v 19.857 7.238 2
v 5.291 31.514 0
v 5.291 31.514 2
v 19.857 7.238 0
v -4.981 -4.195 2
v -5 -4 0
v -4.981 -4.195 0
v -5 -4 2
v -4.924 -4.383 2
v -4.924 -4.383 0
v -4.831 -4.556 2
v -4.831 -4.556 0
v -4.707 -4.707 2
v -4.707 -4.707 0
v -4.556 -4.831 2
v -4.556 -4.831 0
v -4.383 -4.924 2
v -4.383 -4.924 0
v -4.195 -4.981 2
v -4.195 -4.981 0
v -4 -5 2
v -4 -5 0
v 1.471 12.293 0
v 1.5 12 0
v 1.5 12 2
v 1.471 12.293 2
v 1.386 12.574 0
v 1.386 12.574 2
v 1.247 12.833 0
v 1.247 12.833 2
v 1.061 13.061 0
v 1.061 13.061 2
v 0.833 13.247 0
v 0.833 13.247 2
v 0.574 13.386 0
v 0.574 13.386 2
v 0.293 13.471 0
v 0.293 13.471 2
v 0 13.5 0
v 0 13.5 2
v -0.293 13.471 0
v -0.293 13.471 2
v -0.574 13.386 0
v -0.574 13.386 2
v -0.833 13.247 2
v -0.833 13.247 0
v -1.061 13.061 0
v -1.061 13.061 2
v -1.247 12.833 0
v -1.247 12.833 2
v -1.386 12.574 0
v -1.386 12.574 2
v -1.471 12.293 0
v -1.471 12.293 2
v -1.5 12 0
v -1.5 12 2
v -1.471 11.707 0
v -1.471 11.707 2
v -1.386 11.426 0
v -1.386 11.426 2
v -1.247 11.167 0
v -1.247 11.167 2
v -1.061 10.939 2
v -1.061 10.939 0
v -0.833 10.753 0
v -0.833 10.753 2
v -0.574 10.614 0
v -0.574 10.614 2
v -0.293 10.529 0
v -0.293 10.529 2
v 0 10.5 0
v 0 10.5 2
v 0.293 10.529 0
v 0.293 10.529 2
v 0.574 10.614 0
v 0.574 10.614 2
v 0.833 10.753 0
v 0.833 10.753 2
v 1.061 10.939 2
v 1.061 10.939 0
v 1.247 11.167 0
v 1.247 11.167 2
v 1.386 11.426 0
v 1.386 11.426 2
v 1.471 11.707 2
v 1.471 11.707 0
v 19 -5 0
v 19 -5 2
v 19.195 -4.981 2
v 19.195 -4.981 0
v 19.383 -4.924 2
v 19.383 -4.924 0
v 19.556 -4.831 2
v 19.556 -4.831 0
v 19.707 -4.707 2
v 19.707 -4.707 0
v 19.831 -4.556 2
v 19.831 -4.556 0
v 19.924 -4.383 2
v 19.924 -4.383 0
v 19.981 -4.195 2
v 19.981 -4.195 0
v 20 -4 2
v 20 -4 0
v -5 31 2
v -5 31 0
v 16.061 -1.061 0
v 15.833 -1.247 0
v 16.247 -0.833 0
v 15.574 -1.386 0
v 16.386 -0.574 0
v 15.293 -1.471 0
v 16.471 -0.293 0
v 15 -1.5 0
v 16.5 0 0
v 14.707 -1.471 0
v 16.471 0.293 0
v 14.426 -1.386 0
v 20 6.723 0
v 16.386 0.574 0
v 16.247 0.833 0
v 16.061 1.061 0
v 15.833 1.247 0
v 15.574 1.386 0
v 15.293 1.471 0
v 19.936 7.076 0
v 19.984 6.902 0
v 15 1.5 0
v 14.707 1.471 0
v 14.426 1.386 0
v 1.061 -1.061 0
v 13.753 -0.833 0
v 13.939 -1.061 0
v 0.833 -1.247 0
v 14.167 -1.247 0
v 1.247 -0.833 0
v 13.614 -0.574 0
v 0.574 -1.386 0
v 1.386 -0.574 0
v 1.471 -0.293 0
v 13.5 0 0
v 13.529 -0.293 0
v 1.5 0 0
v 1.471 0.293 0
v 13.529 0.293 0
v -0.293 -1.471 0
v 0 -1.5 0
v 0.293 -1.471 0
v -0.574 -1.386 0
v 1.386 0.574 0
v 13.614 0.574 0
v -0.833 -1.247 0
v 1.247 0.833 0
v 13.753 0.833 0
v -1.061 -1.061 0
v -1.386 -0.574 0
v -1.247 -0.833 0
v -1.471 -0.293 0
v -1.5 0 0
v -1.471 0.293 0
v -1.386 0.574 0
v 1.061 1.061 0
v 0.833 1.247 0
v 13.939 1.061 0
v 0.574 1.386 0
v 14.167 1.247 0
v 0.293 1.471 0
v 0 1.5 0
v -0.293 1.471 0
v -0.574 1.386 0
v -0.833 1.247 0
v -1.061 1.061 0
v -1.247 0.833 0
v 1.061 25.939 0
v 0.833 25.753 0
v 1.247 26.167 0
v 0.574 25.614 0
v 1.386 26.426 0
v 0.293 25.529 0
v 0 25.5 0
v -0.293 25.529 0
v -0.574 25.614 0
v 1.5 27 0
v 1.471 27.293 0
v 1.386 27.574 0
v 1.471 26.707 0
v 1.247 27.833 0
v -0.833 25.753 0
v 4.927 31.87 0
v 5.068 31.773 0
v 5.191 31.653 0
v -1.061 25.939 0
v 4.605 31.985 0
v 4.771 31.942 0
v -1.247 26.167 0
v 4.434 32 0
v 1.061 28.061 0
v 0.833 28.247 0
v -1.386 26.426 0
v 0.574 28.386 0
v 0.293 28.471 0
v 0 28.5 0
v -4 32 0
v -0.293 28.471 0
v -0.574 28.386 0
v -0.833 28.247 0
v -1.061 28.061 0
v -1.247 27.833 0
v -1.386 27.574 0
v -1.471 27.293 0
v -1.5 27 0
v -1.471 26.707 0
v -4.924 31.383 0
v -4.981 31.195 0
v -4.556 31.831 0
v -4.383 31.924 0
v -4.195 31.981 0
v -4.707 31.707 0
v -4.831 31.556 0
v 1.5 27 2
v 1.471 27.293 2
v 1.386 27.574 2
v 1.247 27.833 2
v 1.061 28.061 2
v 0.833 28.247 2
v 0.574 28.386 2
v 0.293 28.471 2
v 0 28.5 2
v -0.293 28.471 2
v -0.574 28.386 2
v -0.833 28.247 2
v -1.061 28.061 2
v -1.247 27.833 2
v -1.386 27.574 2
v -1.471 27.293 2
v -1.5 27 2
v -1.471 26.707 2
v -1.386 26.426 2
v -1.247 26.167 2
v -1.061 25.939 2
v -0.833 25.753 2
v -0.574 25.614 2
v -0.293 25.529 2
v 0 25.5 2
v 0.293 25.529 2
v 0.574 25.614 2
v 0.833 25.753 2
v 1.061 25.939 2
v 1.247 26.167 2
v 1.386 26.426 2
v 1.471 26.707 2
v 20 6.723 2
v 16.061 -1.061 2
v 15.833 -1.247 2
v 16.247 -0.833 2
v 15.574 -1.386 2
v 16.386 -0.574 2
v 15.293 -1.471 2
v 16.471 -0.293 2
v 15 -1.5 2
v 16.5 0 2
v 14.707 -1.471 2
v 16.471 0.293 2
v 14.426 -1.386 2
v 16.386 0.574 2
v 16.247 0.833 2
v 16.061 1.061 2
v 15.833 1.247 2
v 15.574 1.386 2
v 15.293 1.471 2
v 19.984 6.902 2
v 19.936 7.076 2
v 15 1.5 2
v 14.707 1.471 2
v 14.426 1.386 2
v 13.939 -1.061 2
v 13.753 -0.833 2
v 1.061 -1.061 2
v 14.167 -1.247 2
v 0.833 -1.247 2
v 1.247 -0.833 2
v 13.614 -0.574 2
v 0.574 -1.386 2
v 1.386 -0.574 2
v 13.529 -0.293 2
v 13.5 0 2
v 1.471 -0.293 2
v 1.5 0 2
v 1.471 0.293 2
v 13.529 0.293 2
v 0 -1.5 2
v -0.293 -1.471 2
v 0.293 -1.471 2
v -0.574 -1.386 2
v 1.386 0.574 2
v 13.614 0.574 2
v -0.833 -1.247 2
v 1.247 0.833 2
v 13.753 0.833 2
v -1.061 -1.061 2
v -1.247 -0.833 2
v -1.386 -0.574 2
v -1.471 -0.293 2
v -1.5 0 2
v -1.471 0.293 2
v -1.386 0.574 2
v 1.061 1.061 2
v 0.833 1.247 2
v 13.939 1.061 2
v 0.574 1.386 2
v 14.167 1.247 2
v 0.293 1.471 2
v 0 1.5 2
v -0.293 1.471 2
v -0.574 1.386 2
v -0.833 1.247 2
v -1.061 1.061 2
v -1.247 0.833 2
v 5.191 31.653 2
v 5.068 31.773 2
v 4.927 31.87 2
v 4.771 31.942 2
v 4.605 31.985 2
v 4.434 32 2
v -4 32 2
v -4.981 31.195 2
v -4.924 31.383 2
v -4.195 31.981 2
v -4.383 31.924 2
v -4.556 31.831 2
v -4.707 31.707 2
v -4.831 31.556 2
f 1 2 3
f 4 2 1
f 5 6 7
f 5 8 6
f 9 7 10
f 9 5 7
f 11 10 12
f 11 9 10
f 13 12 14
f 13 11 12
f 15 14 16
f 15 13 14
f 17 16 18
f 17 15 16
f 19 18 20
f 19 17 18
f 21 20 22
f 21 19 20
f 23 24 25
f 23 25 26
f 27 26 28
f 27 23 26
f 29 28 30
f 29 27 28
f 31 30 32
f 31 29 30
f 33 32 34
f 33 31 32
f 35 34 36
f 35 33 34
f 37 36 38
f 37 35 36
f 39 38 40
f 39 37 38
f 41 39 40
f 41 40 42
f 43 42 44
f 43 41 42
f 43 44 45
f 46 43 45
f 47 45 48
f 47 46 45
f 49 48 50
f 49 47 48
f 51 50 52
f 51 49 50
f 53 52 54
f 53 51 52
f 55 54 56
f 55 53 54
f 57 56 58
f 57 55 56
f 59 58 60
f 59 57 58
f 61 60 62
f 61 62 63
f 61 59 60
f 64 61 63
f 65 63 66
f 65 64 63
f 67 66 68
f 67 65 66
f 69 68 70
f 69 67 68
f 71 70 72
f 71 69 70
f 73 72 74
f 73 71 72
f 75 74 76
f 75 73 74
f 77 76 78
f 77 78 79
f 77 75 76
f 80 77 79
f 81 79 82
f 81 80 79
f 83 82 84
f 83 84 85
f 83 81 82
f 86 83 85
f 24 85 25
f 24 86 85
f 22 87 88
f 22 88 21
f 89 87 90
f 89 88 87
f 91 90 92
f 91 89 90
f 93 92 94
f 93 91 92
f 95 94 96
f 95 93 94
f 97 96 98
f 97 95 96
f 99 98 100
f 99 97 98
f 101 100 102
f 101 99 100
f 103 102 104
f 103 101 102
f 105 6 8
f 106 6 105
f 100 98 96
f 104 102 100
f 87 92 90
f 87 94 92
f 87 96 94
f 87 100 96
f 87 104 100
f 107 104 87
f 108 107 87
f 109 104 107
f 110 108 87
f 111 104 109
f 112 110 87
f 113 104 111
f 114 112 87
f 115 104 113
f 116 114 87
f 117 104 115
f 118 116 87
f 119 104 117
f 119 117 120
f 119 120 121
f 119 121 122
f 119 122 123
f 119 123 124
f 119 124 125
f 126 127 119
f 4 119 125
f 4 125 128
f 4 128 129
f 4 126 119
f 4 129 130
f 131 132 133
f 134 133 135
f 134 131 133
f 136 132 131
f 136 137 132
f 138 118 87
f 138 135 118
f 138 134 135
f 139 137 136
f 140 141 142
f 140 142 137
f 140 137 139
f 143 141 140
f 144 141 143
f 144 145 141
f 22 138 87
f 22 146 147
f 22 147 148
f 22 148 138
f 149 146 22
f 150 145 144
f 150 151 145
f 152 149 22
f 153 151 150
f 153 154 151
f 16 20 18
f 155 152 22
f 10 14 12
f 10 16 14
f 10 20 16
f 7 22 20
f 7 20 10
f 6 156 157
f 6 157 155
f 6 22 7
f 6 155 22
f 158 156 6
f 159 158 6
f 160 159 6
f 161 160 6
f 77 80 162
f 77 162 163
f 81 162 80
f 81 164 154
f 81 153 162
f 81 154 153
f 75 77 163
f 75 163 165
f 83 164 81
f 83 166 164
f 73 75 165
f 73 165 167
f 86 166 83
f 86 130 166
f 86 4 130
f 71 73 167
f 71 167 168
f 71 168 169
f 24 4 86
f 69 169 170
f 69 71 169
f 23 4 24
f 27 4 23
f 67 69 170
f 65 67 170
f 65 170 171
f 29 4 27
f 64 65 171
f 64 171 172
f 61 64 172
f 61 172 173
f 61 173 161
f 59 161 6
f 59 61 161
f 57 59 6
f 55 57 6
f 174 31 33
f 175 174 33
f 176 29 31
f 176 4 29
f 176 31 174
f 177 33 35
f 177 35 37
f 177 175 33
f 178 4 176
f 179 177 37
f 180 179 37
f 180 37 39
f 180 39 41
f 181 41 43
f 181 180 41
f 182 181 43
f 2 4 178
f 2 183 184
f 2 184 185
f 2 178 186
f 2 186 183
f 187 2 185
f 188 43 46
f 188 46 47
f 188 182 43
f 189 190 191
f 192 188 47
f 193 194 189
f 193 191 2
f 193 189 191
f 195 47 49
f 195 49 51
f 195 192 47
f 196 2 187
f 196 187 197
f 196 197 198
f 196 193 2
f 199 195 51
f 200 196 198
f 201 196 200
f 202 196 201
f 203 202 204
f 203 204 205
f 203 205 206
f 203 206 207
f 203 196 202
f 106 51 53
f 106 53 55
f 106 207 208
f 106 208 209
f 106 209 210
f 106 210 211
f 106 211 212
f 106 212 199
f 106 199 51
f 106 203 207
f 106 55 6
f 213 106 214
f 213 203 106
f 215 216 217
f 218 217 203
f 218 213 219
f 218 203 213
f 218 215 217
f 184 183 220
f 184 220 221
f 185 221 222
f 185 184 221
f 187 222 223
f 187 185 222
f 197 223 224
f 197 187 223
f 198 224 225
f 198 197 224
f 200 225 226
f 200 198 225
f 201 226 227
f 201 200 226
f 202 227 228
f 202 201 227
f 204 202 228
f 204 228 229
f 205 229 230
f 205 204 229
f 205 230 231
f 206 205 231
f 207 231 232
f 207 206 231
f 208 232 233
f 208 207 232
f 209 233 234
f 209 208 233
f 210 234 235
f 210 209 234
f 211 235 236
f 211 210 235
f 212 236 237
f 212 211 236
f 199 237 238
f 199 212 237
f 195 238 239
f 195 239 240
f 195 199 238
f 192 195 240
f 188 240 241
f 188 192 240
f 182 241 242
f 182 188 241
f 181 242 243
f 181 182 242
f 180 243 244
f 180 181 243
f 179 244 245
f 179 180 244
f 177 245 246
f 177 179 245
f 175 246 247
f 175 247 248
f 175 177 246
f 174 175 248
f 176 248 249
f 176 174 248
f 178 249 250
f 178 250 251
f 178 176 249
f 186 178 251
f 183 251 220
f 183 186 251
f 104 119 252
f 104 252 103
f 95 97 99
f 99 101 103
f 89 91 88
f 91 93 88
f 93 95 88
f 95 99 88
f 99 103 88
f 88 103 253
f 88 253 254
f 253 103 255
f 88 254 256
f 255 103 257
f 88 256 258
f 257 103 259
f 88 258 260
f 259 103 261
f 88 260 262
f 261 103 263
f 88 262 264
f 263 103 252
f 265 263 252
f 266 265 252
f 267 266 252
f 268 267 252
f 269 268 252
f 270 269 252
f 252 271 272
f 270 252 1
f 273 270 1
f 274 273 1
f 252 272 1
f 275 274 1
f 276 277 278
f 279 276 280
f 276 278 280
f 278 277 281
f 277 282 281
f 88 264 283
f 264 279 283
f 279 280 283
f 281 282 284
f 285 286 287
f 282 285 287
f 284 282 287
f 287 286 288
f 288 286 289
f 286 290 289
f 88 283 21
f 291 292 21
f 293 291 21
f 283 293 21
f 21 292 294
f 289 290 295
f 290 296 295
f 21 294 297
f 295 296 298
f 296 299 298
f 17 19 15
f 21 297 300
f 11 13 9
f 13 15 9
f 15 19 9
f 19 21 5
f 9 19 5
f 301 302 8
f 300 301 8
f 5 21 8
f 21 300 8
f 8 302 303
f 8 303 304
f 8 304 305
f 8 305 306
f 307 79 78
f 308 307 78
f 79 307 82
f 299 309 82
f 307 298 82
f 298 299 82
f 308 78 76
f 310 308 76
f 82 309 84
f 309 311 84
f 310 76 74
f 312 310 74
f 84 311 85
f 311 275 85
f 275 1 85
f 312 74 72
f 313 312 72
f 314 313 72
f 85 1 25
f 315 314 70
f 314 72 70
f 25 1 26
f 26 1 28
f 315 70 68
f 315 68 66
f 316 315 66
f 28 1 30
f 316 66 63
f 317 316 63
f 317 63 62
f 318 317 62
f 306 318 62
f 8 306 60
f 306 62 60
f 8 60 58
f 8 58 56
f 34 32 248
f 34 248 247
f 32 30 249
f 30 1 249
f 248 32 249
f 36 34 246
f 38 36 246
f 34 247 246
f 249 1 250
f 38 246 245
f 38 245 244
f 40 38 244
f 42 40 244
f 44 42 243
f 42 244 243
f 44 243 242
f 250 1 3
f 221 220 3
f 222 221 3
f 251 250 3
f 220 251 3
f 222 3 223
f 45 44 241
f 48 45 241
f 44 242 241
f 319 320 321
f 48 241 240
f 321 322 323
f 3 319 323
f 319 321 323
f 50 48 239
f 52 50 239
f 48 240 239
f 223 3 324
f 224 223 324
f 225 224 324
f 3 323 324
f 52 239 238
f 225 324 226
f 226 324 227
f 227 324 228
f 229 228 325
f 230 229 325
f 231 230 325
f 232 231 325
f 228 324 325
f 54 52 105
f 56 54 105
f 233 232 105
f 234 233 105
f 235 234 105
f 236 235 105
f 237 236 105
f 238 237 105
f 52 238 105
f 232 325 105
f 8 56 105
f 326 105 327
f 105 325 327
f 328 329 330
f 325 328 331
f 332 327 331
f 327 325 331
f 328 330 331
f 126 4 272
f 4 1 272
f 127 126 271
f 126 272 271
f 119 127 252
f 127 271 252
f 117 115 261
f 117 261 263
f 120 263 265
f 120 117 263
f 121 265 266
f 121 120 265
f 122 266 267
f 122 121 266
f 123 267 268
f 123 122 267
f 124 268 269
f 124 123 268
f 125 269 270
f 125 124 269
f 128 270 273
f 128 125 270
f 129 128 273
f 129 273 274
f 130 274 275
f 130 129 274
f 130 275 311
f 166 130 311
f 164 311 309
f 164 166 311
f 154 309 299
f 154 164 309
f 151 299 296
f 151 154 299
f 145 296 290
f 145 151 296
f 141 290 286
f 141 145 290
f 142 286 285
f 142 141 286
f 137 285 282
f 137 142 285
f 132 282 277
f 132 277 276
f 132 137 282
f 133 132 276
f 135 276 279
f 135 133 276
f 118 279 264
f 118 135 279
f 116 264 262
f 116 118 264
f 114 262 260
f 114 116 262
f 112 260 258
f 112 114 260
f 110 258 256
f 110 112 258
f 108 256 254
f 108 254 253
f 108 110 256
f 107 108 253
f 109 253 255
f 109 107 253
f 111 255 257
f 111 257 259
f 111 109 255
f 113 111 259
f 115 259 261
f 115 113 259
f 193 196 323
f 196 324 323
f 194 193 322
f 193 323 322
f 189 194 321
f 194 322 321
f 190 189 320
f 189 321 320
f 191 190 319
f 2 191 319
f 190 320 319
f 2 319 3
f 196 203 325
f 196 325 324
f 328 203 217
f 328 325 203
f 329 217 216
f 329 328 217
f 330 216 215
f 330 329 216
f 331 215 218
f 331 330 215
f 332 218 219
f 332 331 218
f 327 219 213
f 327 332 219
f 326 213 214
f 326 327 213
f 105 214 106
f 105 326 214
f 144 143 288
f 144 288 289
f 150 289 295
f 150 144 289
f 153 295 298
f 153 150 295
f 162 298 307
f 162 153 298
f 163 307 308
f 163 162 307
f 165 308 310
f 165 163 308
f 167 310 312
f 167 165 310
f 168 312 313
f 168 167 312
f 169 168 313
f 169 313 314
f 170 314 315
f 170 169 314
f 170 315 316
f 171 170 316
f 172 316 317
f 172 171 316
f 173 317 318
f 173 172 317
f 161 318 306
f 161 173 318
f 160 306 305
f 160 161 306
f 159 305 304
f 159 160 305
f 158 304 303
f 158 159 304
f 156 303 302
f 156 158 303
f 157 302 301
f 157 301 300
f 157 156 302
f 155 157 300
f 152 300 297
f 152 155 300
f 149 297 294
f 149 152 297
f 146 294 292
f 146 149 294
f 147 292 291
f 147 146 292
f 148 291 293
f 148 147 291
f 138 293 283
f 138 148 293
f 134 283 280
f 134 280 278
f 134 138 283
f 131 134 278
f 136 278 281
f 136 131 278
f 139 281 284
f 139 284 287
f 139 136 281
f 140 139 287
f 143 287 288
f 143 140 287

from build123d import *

# Parameters (mm, degrees)
SKETCH_1_R      = 1.5
EXTRUDE_1_DEPTH = 2
FILLET_1_R      = 1


with BuildPart() as part:
    # 草图1 → 凸台-拉伸1 (new body)
    with BuildSketch(Plane.XY):
        Polygon((-5, 32), (5, 32), (20, 7), (20, -5), (-5, -5), align=None)
        with Locations((0, 27)):
            Circle(SKETCH_1_R, mode=Mode.SUBTRACT)
        with Locations((0, 12)):
            Circle(SKETCH_1_R, mode=Mode.SUBTRACT)
        with Locations((15, 0)):
            Circle(SKETCH_1_R, mode=Mode.SUBTRACT)
        Circle(SKETCH_1_R, mode=Mode.SUBTRACT)
    extrude(amount=EXTRUDE_1_DEPTH)

    # 圆角1
    fillet_1_edges = [part.edges().sort_by_distance(p)[0] for p in [
        (-5, 32, 1),
        (5, 32, 1),
        (20, 7, 1),
        (20, -5, 1),
        (-5, -5, 1),
    ]]
    fillet(fillet_1_edges, radius=FILLET_1_R)


solid = part.part
